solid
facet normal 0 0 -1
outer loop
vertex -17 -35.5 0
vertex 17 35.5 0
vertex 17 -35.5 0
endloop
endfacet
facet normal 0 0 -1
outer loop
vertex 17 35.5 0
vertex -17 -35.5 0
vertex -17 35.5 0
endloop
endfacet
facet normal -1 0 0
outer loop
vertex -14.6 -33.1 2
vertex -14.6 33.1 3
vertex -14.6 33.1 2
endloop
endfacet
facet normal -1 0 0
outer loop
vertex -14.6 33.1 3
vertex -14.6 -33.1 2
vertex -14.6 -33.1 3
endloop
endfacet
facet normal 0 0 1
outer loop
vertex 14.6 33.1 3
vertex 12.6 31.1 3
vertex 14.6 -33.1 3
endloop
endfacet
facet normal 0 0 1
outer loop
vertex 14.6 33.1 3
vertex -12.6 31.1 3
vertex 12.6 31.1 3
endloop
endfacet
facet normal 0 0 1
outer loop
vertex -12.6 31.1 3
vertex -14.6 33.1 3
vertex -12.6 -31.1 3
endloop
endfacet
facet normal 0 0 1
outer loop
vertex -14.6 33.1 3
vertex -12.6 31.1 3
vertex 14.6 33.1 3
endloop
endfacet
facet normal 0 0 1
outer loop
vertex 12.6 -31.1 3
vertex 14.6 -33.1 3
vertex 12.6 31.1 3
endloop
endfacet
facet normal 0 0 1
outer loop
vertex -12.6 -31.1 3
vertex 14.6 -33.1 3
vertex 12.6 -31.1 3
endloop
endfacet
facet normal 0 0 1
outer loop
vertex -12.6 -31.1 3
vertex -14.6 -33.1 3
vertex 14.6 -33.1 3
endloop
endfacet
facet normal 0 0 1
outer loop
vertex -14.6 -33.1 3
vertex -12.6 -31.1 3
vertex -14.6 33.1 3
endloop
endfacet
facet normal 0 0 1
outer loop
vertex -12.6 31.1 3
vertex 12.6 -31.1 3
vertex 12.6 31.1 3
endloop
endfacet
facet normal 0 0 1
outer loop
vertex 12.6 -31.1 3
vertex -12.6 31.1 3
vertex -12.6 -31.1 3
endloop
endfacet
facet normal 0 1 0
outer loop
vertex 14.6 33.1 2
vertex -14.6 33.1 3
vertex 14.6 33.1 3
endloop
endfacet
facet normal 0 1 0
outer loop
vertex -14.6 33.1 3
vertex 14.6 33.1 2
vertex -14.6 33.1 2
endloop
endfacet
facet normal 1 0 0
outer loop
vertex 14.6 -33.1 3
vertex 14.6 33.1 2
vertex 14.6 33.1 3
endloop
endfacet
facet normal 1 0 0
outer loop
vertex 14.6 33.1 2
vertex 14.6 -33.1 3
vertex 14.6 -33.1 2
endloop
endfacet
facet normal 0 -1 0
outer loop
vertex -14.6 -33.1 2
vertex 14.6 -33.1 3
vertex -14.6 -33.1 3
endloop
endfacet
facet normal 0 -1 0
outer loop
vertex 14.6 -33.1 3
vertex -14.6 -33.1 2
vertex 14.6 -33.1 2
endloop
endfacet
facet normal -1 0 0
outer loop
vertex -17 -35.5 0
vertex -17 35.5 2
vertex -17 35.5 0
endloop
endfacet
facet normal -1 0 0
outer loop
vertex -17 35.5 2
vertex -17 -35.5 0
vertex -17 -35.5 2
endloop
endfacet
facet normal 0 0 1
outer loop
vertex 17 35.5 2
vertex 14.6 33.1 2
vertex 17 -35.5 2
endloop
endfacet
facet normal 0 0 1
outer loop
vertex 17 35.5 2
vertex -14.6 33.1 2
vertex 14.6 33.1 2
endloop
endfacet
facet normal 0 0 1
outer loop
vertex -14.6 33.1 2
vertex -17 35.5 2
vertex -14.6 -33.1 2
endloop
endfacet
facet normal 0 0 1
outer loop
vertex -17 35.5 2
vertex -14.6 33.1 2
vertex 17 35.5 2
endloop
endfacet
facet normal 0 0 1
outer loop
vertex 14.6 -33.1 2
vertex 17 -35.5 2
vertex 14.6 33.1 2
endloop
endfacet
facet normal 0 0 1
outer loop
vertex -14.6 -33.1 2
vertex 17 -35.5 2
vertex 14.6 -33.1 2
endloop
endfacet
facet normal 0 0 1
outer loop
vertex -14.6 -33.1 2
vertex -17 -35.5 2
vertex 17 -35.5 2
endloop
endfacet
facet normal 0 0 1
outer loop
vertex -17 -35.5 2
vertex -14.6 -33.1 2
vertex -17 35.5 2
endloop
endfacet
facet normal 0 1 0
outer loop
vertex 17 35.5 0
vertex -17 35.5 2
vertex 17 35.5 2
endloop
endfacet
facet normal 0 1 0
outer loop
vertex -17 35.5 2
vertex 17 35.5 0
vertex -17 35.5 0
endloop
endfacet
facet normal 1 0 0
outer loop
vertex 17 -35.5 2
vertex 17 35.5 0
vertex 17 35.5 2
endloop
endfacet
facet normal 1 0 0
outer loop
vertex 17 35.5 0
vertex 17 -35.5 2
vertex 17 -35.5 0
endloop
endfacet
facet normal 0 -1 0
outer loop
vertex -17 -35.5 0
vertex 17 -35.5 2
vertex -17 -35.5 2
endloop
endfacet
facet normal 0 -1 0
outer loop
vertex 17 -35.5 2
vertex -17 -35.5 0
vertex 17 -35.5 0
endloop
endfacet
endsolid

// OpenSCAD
// file: vars-charger.scad
echo(version=version());
//All dimensions are in mm

l = 71; // lenght of box in x dir
w = 34;  // width of box in y dir
h=26;    // height of box without lid
wall=2;  // wall thickness
postloc=23.5; // where the edge posts are in y direction
postradius=2 ;  //Dimension of posts in x and y
postholeradius=1.25;
postheight=8;
basethickness=3;
holdslotloc=81.5;
holdslotwidth=10;
wireholddiameter = 6;
switchcutout = [28,22];
//Perforation size: 23mm*10.5mm
voltmetercutout=[24,11.5];
// Allow for slip by making the ridge a little smaller than the box it fits into.
interference=0.8;
// main file
//Cover with a slot for the wire egress
//All dimensions are in mm


// Create the exterior box, subtract the interior, and subtract the slot.

include <vars-charger.scad>;
translate ([0,0,0])
linear_extrude(height = wall)
            square([w, l
            ], center = true);
 // now the inside rim is another box minus a other box...
 //  taking into account that we need to give some slip fit with the interference parameter
difference() {
    linear_extrude(height = basethickness)
            square([w-2*wall-interference, l-2*wall-interference
            ], center = true);
    translate ([0,0,basethickness])
    linear_extrude(height = basethickness)
            square([w-4*wall-interference, l-4*wall-interference
            ], center = true);
}
